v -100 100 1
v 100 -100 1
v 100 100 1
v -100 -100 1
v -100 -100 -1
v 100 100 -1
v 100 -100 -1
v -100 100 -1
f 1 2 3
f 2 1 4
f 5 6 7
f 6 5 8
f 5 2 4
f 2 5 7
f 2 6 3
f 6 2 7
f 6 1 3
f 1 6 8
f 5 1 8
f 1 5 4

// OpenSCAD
// Parameters
sheet_length = 200; //[100:400:1]
sheet_width  = 200; //[100:400:1]
sheet_thickness = 2; //[1:6:0.5]

// Robust thickness to avoid blank/empty renders (e.g., too-thin preview artifacts)
min_thickness = 1.0;
t = max(sheet_thickness, min_thickness);

// Geometry (one connected solid)
color([0.85, 0.85, 0.8])
cube([sheet_length, sheet_width, t], center=true);
